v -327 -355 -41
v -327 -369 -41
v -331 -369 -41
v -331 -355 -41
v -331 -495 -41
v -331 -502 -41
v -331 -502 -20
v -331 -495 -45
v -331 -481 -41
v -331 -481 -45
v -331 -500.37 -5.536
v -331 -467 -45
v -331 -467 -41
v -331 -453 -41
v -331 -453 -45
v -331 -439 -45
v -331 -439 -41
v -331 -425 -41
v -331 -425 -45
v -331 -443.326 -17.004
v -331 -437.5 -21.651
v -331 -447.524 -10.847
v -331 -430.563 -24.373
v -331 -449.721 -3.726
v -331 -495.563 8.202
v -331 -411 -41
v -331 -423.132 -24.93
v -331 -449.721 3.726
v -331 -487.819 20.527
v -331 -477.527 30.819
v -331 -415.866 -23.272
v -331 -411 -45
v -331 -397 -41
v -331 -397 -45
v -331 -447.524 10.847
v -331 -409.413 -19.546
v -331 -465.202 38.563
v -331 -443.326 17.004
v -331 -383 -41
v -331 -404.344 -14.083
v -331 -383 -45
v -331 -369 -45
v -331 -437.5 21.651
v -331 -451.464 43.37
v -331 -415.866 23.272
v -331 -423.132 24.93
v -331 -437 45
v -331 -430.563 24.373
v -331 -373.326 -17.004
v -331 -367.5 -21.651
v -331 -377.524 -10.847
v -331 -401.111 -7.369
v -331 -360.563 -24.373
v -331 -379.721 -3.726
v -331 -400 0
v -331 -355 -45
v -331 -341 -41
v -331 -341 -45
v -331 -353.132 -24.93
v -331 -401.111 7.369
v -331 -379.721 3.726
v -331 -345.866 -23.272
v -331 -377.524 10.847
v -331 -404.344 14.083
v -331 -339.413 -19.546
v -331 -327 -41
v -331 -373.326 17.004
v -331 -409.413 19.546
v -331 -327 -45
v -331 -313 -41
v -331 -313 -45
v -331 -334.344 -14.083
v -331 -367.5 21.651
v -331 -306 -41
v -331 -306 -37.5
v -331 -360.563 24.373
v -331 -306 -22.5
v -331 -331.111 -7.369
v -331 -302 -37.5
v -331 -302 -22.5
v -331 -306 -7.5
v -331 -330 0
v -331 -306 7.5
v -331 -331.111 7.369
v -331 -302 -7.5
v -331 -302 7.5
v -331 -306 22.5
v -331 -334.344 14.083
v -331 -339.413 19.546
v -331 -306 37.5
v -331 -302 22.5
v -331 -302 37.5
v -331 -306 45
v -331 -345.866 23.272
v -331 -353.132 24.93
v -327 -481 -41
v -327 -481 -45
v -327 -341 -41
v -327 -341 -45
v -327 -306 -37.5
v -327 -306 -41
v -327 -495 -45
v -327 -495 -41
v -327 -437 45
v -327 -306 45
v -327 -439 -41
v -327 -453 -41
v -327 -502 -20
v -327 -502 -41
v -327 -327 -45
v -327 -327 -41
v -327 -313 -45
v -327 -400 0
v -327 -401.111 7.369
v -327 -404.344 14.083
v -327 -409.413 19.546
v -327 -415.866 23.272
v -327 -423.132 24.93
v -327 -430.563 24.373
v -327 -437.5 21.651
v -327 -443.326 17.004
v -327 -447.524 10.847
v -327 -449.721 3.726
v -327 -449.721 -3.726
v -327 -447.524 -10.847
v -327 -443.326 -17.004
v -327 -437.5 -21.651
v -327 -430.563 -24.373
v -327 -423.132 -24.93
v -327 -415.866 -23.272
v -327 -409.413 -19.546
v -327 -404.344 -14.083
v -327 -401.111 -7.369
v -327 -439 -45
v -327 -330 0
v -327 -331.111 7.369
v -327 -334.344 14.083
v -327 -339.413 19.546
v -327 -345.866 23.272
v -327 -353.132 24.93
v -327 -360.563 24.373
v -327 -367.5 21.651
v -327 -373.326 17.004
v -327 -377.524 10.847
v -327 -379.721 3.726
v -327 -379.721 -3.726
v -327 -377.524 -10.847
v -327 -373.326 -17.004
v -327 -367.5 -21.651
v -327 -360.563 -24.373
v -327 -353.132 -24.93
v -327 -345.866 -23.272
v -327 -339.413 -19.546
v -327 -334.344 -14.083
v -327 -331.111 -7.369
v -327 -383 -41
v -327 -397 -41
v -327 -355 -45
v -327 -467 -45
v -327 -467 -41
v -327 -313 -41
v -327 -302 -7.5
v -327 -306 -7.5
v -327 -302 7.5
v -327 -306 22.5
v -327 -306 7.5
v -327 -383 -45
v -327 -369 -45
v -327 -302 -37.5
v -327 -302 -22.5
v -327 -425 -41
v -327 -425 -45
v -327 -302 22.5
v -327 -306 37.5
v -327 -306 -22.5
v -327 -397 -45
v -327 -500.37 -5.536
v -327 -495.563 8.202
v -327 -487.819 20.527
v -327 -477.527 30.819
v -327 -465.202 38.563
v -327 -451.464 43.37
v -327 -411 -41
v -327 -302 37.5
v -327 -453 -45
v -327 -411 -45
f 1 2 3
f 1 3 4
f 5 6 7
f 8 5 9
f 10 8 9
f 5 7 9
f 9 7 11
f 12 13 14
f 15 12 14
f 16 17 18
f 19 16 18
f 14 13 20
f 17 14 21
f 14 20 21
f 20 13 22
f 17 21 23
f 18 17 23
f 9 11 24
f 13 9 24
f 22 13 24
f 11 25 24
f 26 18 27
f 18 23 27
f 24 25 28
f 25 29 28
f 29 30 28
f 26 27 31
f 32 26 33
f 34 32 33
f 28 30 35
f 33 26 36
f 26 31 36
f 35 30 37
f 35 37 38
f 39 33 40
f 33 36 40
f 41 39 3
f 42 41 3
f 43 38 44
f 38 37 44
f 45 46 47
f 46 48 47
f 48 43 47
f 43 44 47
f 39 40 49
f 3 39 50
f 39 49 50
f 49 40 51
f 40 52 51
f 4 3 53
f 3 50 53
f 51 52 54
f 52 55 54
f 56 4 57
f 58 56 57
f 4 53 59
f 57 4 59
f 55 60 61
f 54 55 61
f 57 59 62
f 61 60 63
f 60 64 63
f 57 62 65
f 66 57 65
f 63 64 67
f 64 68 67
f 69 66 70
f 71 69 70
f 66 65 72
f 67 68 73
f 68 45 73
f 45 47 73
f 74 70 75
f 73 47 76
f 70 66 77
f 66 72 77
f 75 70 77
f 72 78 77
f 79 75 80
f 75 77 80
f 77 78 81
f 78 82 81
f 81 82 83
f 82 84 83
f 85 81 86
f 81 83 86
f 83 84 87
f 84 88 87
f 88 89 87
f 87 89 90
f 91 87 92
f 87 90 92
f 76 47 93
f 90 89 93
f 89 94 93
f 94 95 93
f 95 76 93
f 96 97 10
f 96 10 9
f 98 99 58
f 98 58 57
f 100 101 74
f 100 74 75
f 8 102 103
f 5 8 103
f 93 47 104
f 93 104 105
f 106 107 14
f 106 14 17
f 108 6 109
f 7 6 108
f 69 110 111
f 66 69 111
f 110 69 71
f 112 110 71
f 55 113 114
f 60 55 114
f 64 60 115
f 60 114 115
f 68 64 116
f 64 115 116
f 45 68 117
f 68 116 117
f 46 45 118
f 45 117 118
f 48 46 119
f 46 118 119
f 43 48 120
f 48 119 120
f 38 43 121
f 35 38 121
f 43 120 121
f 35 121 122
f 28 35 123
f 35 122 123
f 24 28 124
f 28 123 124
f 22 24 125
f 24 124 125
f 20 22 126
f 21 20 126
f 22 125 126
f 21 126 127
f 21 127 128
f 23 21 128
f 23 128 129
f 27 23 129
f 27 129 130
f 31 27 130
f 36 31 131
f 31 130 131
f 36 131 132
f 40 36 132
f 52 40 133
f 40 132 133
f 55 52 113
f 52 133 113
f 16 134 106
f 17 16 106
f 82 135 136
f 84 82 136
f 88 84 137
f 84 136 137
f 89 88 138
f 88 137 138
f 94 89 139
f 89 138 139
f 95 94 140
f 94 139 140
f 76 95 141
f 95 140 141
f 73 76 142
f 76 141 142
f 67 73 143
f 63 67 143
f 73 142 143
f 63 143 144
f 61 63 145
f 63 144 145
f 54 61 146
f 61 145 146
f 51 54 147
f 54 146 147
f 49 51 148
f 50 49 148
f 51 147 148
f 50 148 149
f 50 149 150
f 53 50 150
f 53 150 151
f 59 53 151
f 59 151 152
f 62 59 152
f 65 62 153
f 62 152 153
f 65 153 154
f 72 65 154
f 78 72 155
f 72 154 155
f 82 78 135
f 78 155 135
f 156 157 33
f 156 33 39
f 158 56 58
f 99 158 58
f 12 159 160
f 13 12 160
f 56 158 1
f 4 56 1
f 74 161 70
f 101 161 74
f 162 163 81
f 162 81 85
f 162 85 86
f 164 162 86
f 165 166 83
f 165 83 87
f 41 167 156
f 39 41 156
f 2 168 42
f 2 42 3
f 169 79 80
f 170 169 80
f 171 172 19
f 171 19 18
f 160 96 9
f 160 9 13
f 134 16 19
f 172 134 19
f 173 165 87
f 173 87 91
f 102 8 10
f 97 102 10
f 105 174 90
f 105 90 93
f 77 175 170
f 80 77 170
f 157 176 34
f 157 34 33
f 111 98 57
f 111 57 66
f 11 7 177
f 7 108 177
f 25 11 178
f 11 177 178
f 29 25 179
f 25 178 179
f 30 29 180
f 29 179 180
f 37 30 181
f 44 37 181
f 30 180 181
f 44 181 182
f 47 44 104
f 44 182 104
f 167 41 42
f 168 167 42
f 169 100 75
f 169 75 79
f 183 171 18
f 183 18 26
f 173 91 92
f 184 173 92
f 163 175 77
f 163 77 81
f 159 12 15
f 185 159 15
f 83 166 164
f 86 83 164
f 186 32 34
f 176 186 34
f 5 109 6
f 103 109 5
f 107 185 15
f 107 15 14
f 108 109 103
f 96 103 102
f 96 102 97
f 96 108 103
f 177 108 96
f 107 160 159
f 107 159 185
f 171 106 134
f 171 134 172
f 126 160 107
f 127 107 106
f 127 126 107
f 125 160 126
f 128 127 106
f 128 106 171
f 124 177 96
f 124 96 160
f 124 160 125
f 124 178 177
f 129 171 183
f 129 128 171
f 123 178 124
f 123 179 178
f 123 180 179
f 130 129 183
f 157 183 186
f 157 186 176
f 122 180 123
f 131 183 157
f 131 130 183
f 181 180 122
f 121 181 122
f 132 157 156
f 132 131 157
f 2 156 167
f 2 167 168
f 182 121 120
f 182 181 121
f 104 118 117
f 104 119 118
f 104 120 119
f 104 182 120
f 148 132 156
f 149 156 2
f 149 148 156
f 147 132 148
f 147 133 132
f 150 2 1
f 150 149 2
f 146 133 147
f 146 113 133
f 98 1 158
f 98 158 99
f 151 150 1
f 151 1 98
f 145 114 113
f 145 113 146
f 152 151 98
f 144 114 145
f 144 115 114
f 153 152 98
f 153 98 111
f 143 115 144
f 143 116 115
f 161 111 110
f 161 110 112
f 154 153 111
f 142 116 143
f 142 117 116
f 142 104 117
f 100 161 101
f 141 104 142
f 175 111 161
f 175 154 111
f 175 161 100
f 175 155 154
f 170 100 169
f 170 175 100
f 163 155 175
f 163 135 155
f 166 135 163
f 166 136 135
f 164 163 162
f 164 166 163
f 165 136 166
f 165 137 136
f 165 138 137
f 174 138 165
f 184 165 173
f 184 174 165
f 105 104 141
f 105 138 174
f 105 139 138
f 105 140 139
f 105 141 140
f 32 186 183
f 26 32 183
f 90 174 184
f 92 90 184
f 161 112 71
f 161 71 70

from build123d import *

# Parameters (mm, degrees)
SKETCH071_W     = 200
SKETCH071_H     = 90
PAD035_DEPTH    = 4
SKETCH070_R     = 25
SKETCH070_W     = 7
SKETCH070_H     = 4
SKETCH070_W_2   = 14
SKETCH070_W_3   = 4
SKETCH070_H_2   = 15
SKETCH070_H_3   = 7.5
POCKET031_DEPTH = 4
FILLET002_R     = 65


with BuildPart() as part:
    # Sketch071 → Pad035 (new body)
    with BuildSketch(Plane.YZ):
        Rectangle(SKETCH071_W, SKETCH071_H)
    extrude(amount=PAD035_DEPTH)

    # Sketch070 (on Face6 of Pad035) → Pocket031 (cut)
    with BuildSketch(Plane.YZ.offset(4)):
        with Locations((-23, 0)):
            Circle(SKETCH070_R)
        with Locations((47, 0)):
            Circle(SKETCH070_R)
        with Locations((-96.5, -43)):
            Rectangle(SKETCH070_W, SKETCH070_H)
        with Locations((-72, -43)):
            Rectangle(SKETCH070_W_2, SKETCH070_H)
        with Locations((-44, -43)):
            Rectangle(SKETCH070_W_2, SKETCH070_H)
        with Locations((-16, -43)):
            Rectangle(SKETCH070_W_2, SKETCH070_H)
        with Locations((12, -43)):
            Rectangle(SKETCH070_W_2, SKETCH070_H)
        with Locations((40, -43)):
            Rectangle(SKETCH070_W_2, SKETCH070_H)
        with Locations((68, -43)):
            Rectangle(SKETCH070_W_2, SKETCH070_H)
        with Locations((98, -15)):
            Rectangle(SKETCH070_W_3, SKETCH070_H_2)
        with Locations((98, 15)):
            Rectangle(SKETCH070_W_3, SKETCH070_H_2)
        with Locations((98, 41.25)):
            Rectangle(SKETCH070_W_3, SKETCH070_H_3)
        Polygon((89, -45), (89, -41), (96, -41), (96, -37.5), (100, -37.5), (100, -45), align=None)
    extrude(amount=-POCKET031_DEPTH, mode=Mode.SUBTRACT)

    # Fillet002
    fillet002_edges = [part.edges().sort_by_distance(p)[0] for p in [
        (2, -100, 45),
    ]]
    fillet(fillet002_edges, radius=FILLET002_R)


with BuildPart() as part_1:
    # Body035 placement: moved
    add(part.part.moved(Location((-331, -402, 0))))


solid = part_1.part
